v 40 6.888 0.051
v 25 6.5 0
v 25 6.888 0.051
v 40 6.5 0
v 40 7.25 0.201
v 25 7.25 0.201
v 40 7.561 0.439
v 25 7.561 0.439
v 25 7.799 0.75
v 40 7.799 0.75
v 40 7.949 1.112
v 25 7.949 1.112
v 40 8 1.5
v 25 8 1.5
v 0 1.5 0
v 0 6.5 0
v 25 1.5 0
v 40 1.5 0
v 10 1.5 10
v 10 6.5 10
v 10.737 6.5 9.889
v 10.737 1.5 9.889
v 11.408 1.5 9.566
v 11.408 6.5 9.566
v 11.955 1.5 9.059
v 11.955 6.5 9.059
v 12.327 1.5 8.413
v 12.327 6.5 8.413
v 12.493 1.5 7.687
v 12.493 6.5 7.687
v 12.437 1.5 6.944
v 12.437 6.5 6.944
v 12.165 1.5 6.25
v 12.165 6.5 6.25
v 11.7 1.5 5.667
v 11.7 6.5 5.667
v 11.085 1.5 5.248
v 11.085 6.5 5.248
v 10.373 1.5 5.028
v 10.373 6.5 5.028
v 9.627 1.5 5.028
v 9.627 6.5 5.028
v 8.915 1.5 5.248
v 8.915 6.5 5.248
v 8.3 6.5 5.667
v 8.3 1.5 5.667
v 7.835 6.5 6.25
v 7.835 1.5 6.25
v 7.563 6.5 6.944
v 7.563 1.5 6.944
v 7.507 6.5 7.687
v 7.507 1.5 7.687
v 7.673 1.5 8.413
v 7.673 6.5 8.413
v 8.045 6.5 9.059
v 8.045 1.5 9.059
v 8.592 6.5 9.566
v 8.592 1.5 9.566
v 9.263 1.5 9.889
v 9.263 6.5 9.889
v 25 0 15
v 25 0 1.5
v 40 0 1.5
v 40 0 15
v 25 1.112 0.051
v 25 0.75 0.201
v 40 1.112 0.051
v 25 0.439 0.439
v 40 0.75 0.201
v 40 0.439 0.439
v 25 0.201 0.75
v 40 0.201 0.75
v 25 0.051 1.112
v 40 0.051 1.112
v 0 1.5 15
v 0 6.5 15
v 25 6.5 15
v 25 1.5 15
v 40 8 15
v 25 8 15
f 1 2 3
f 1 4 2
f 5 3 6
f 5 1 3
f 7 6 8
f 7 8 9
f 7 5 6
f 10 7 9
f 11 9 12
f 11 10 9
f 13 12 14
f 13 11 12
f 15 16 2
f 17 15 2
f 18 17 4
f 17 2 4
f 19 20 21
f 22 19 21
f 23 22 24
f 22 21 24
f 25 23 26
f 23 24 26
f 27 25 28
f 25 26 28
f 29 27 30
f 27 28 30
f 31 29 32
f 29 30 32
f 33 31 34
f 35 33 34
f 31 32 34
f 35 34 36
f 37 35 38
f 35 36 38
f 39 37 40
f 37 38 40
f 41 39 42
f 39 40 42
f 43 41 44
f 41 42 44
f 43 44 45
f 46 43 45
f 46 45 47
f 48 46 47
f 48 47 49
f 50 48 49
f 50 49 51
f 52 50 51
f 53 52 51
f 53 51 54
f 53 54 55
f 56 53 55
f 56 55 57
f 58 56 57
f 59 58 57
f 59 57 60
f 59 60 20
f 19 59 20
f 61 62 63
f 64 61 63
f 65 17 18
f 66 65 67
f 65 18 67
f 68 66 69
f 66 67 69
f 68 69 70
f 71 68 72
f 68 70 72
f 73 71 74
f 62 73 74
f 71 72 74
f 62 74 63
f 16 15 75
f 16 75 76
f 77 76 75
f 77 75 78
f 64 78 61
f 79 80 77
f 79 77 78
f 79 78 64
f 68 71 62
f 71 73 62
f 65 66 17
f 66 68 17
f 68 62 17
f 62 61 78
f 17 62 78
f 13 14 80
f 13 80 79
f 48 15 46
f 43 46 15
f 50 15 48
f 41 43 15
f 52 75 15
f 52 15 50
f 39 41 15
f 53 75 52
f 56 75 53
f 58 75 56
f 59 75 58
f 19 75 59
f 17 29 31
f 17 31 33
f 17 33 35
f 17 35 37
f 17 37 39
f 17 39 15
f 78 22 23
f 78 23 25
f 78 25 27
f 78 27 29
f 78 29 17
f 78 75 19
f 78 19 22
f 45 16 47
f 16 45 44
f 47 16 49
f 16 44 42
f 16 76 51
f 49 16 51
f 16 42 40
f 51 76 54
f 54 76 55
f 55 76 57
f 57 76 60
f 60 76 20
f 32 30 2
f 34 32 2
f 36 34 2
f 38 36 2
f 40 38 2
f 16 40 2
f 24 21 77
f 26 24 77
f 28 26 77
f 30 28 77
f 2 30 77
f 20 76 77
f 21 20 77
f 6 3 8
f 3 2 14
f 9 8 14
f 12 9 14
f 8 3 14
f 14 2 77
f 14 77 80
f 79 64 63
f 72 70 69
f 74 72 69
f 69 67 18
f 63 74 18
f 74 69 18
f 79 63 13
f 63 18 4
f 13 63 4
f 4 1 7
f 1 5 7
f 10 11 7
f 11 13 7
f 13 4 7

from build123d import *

# Parameters (mm, degrees)
SKETCH1_W           = 40
SKETCH1_H           = 8
BOSS_EXTRUDE1_DEPTH = 15
SKETCH2_W           = 29.034597986
SKETCH2_H           = 11.917160172
SKETCH2_W_2         = 30.589488345
SKETCH2_H_2         = 7.948253972
CUT_EXTRUDE1_DEPTH  = 15
SKETCH3_R           = 2.5
CUT_EXTRUDE2_DEPTH  = 15
FILLET1_R           = 1.5


with BuildPart() as part:
    # Sketch1 → Boss-Extrude1 (new body)
    with BuildSketch(Plane.XY):
        with Locations((20, 4)):
            Rectangle(SKETCH1_W, SKETCH1_H)
    extrude(amount=BOSS_EXTRUDE1_DEPTH)

    # Sketch2 → Cut-Extrude1 (cut)
    with BuildSketch(Plane.XY.offset(15)):
        with Locations((10.482701007, 12.458580086)):
            Rectangle(SKETCH2_W, SKETCH2_H)
        with Locations((9.705255828, -2.474126986)):
            Rectangle(SKETCH2_W_2, SKETCH2_H_2)
    extrude(amount=-CUT_EXTRUDE1_DEPTH, mode=Mode.SUBTRACT)

    # Sketch3 → Cut-Extrude2 (cut)
    with BuildSketch(Plane(origin=(0, 6.5, 0), x_dir=(1, 0, 0), z_dir=(0, 1, 0))):
        with Locations(Location((10, -7.5, 0), (0, 0, 270))):
            Circle(SKETCH3_R)
    extrude(amount=-CUT_EXTRUDE2_DEPTH, mode=Mode.SUBTRACT)

    # Fillet1
    fillet1_edges = [part.edges().sort_by_distance(p)[0] for p in [
        (32.5, 8, 0),
        (32.5, 0, 0),
    ]]
    fillet(fillet1_edges, radius=FILLET1_R)


solid = part.part
